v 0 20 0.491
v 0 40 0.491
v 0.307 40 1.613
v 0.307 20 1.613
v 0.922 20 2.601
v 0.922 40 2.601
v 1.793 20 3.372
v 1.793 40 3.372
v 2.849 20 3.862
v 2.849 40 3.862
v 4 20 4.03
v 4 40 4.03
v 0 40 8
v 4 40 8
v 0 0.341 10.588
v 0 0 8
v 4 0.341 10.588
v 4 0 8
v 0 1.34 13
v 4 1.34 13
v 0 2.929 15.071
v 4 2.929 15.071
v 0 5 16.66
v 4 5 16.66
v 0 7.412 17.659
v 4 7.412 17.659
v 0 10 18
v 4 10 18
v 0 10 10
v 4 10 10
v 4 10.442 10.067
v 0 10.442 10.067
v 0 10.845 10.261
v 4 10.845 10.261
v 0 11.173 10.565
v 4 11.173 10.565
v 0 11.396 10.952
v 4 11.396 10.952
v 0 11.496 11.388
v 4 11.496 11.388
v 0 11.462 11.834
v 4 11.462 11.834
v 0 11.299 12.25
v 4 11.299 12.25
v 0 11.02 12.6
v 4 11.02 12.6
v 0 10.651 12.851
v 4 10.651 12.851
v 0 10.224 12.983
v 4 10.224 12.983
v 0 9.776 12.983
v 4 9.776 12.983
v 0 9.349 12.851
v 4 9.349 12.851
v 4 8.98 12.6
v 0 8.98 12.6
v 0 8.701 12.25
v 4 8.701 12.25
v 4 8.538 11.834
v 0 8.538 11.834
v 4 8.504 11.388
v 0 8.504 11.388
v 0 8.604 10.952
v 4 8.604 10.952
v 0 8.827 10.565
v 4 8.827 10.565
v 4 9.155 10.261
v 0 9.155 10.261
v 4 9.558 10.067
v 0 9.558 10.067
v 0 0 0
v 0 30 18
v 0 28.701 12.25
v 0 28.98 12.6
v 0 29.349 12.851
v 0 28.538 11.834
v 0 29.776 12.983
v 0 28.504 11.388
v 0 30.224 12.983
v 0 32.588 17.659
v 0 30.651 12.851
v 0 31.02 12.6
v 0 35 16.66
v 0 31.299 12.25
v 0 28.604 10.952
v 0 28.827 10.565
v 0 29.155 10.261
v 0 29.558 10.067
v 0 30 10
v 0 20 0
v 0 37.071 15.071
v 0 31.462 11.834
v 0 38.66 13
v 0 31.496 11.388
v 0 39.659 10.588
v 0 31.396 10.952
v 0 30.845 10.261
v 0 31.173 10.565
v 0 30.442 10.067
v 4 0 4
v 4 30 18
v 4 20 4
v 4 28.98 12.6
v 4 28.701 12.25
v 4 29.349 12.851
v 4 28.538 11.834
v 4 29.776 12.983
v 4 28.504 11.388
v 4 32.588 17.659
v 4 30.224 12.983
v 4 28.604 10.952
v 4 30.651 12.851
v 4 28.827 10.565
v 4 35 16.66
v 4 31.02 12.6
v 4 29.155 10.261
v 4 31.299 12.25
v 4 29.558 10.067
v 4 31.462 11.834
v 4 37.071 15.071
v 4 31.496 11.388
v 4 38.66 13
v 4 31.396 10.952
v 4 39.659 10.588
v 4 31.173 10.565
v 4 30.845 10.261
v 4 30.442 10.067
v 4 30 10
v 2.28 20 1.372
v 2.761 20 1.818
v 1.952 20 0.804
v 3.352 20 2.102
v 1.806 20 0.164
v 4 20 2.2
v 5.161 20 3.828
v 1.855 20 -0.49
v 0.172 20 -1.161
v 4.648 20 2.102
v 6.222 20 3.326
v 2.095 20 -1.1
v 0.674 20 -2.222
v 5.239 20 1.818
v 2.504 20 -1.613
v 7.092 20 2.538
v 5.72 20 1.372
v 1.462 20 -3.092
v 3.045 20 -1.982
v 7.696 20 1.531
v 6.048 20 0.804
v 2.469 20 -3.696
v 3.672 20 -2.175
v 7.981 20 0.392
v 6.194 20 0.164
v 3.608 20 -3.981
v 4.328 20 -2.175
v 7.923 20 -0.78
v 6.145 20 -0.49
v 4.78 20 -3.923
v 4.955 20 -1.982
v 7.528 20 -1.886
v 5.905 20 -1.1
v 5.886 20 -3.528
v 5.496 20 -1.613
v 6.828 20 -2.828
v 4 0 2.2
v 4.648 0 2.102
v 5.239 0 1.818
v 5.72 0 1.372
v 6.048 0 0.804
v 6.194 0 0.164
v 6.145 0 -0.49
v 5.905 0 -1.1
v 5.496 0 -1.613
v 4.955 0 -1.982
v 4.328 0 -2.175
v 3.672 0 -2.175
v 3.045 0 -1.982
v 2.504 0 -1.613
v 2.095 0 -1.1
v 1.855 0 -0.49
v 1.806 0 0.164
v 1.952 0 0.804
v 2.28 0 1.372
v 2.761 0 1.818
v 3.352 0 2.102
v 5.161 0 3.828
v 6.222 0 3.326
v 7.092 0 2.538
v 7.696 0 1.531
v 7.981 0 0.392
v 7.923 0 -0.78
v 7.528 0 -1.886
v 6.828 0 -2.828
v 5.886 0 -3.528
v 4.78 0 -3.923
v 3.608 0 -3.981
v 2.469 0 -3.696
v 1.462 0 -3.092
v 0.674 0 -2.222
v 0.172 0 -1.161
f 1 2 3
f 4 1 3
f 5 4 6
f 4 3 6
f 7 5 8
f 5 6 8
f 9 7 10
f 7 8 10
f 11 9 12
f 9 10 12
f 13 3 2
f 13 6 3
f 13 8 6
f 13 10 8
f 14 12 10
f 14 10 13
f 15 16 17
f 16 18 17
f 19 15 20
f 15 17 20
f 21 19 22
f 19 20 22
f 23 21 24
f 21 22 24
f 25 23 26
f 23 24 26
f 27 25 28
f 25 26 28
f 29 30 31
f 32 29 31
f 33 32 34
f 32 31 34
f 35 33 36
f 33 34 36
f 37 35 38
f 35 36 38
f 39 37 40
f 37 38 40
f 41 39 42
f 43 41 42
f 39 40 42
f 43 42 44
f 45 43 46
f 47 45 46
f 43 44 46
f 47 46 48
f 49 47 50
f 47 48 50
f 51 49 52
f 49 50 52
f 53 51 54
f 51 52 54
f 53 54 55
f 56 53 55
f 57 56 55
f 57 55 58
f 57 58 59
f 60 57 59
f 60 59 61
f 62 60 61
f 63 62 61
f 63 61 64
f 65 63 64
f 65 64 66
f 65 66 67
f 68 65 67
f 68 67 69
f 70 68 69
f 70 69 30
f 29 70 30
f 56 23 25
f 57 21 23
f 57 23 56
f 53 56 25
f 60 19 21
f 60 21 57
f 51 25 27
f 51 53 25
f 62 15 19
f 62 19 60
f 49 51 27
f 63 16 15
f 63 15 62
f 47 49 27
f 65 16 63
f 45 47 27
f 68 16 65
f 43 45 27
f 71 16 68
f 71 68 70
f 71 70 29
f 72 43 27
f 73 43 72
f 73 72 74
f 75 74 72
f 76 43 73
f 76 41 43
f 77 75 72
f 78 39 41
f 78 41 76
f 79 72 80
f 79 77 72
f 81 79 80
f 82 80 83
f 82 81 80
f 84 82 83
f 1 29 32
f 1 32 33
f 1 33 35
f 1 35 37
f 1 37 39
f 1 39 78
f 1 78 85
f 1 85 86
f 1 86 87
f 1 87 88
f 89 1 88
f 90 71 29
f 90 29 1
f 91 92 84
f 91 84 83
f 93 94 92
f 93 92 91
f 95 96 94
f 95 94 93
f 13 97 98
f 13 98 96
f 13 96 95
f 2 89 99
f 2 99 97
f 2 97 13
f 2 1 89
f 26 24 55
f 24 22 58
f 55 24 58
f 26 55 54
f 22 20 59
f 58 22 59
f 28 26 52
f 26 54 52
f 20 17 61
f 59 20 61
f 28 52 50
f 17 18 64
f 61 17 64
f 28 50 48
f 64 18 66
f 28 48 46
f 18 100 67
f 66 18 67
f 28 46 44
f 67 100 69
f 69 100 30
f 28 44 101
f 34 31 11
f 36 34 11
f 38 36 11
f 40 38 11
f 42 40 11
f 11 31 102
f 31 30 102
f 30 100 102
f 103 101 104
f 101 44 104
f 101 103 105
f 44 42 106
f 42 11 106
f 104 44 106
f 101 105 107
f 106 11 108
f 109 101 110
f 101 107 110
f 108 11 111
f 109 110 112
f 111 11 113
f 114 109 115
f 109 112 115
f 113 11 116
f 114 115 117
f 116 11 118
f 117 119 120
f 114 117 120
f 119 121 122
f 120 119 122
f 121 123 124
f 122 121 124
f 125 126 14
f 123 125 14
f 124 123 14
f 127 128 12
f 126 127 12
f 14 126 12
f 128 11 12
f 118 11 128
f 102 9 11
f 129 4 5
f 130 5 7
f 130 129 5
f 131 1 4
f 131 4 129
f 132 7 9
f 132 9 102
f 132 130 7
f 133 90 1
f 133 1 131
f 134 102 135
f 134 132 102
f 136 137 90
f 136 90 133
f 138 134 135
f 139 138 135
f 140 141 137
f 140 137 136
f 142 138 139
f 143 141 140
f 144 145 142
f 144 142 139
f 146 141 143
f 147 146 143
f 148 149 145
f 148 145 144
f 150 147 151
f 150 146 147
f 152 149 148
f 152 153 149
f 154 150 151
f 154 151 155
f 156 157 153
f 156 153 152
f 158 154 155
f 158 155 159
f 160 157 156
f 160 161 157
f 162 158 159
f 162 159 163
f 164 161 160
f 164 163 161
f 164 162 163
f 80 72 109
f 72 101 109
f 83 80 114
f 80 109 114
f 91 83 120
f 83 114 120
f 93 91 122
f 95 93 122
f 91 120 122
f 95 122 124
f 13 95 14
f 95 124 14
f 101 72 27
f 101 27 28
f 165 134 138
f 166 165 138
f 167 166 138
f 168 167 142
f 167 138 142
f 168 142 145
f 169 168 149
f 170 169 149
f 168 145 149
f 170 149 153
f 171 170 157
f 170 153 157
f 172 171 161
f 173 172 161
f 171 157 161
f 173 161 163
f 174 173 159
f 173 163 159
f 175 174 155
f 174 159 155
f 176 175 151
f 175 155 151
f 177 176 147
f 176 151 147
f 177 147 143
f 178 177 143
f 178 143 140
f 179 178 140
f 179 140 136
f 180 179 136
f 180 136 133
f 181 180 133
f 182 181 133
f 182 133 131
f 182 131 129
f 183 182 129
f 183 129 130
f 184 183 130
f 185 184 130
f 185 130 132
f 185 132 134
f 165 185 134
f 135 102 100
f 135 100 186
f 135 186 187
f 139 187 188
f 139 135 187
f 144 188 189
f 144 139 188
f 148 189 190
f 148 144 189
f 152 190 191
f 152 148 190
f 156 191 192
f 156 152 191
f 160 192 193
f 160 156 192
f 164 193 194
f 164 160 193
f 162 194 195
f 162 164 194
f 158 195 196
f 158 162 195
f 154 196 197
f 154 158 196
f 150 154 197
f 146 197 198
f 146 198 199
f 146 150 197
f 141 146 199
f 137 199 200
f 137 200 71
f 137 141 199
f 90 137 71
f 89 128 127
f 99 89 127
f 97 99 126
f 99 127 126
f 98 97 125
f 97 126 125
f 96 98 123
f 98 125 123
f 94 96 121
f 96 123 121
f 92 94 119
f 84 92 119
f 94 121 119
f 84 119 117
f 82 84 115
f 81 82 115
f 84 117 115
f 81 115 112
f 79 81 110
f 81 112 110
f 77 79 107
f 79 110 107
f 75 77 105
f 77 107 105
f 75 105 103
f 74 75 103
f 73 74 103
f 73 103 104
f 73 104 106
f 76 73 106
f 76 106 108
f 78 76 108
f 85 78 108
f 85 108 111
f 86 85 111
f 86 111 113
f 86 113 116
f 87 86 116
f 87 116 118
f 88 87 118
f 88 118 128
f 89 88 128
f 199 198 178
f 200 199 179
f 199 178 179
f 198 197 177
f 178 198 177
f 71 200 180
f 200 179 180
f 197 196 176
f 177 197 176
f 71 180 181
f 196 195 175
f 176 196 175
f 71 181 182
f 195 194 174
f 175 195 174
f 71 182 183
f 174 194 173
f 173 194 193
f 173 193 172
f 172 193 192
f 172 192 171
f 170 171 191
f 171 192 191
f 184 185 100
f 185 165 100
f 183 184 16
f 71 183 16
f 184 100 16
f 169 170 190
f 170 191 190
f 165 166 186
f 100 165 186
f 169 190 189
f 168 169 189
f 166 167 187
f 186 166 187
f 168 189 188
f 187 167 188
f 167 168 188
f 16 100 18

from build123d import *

# Parameters (mm, degrees)
SKETCH1_W           = 4
SKETCH1_H           = 40
EXTRUDE_THIN2_DEPTH = 18
SKETCH4_R           = 4
SKETCH7_R           = 2.2
CUT_EXTRUDE2_DEPTH  = 45.586993619
SKETCH8_R           = 4.03
CUT_EXTRUDE5_DEPTH  = 20
SKETCH9_R           = 1.5
CUT_EXTRUDE6_DEPTH  = 45.045431091
FILLET1_R           = 10


with BuildPart() as part:
    # Sketch1 → Extrude-Thin2 (new body)
    with BuildSketch(Plane.XY):
        with Locations((2, 20)):
            Rectangle(SKETCH1_W, SKETCH1_H)
    extrude(amount=EXTRUDE_THIN2_DEPTH)

    # Sweep3: sweep along a curve in space
    with BuildLine() as sweep3_path:
        Line((4, 0, 0), (4, 40, 0))
    # Sketch4 → Sweep3 (sweep)
    with BuildSketch(Plane(origin=(0, 40, 0), x_dir=(1, 0, 0), z_dir=(0, 1, 0))):
        with Locations((4, 0)):
            Circle(SKETCH4_R)
    sweep(path=sweep3_path.line)

    # Sketch7 → Cut-Extrude2 (cut, through all)
    with BuildSketch(Plane(origin=(0, 40, 0), x_dir=(1, 0, 0), z_dir=(0, 1, 0))):
        with Locations(Location((4, 0, 0), (0, 0, 270))):
            Circle(SKETCH7_R)
    extrude(amount=-CUT_EXTRUDE2_DEPTH, mode=Mode.SUBTRACT)

    # Sketch8 → Cut-Extrude5 (cut)
    with BuildSketch(Plane(origin=(0, 40, 0), x_dir=(1, 0, 0), z_dir=(0, 1, 0))):
        with Locations((4, 0)):
            Circle(SKETCH8_R)
    extrude(amount=-CUT_EXTRUDE5_DEPTH, mode=Mode.SUBTRACT)

    # Sketch9 → Cut-Extrude6 (cut, through all)
    with BuildSketch(Plane(origin=(4, 0, 0), x_dir=(0, 0, -1), z_dir=(1, 0, 0))):
        with Locations((-11.5, 10)):
            Circle(SKETCH9_R)
        with Locations((-11.5, 30)):
            Circle(SKETCH9_R)
    extrude(amount=-CUT_EXTRUDE6_DEPTH, mode=Mode.SUBTRACT)

    # Fillet1
    fillet1_edges = [part.edges().sort_by_distance(p)[0] for p in [
        (2, 0, 18),
        (2, 40, 18),
    ]]
    fillet(fillet1_edges, radius=FILLET1_R)


solid = part.part
